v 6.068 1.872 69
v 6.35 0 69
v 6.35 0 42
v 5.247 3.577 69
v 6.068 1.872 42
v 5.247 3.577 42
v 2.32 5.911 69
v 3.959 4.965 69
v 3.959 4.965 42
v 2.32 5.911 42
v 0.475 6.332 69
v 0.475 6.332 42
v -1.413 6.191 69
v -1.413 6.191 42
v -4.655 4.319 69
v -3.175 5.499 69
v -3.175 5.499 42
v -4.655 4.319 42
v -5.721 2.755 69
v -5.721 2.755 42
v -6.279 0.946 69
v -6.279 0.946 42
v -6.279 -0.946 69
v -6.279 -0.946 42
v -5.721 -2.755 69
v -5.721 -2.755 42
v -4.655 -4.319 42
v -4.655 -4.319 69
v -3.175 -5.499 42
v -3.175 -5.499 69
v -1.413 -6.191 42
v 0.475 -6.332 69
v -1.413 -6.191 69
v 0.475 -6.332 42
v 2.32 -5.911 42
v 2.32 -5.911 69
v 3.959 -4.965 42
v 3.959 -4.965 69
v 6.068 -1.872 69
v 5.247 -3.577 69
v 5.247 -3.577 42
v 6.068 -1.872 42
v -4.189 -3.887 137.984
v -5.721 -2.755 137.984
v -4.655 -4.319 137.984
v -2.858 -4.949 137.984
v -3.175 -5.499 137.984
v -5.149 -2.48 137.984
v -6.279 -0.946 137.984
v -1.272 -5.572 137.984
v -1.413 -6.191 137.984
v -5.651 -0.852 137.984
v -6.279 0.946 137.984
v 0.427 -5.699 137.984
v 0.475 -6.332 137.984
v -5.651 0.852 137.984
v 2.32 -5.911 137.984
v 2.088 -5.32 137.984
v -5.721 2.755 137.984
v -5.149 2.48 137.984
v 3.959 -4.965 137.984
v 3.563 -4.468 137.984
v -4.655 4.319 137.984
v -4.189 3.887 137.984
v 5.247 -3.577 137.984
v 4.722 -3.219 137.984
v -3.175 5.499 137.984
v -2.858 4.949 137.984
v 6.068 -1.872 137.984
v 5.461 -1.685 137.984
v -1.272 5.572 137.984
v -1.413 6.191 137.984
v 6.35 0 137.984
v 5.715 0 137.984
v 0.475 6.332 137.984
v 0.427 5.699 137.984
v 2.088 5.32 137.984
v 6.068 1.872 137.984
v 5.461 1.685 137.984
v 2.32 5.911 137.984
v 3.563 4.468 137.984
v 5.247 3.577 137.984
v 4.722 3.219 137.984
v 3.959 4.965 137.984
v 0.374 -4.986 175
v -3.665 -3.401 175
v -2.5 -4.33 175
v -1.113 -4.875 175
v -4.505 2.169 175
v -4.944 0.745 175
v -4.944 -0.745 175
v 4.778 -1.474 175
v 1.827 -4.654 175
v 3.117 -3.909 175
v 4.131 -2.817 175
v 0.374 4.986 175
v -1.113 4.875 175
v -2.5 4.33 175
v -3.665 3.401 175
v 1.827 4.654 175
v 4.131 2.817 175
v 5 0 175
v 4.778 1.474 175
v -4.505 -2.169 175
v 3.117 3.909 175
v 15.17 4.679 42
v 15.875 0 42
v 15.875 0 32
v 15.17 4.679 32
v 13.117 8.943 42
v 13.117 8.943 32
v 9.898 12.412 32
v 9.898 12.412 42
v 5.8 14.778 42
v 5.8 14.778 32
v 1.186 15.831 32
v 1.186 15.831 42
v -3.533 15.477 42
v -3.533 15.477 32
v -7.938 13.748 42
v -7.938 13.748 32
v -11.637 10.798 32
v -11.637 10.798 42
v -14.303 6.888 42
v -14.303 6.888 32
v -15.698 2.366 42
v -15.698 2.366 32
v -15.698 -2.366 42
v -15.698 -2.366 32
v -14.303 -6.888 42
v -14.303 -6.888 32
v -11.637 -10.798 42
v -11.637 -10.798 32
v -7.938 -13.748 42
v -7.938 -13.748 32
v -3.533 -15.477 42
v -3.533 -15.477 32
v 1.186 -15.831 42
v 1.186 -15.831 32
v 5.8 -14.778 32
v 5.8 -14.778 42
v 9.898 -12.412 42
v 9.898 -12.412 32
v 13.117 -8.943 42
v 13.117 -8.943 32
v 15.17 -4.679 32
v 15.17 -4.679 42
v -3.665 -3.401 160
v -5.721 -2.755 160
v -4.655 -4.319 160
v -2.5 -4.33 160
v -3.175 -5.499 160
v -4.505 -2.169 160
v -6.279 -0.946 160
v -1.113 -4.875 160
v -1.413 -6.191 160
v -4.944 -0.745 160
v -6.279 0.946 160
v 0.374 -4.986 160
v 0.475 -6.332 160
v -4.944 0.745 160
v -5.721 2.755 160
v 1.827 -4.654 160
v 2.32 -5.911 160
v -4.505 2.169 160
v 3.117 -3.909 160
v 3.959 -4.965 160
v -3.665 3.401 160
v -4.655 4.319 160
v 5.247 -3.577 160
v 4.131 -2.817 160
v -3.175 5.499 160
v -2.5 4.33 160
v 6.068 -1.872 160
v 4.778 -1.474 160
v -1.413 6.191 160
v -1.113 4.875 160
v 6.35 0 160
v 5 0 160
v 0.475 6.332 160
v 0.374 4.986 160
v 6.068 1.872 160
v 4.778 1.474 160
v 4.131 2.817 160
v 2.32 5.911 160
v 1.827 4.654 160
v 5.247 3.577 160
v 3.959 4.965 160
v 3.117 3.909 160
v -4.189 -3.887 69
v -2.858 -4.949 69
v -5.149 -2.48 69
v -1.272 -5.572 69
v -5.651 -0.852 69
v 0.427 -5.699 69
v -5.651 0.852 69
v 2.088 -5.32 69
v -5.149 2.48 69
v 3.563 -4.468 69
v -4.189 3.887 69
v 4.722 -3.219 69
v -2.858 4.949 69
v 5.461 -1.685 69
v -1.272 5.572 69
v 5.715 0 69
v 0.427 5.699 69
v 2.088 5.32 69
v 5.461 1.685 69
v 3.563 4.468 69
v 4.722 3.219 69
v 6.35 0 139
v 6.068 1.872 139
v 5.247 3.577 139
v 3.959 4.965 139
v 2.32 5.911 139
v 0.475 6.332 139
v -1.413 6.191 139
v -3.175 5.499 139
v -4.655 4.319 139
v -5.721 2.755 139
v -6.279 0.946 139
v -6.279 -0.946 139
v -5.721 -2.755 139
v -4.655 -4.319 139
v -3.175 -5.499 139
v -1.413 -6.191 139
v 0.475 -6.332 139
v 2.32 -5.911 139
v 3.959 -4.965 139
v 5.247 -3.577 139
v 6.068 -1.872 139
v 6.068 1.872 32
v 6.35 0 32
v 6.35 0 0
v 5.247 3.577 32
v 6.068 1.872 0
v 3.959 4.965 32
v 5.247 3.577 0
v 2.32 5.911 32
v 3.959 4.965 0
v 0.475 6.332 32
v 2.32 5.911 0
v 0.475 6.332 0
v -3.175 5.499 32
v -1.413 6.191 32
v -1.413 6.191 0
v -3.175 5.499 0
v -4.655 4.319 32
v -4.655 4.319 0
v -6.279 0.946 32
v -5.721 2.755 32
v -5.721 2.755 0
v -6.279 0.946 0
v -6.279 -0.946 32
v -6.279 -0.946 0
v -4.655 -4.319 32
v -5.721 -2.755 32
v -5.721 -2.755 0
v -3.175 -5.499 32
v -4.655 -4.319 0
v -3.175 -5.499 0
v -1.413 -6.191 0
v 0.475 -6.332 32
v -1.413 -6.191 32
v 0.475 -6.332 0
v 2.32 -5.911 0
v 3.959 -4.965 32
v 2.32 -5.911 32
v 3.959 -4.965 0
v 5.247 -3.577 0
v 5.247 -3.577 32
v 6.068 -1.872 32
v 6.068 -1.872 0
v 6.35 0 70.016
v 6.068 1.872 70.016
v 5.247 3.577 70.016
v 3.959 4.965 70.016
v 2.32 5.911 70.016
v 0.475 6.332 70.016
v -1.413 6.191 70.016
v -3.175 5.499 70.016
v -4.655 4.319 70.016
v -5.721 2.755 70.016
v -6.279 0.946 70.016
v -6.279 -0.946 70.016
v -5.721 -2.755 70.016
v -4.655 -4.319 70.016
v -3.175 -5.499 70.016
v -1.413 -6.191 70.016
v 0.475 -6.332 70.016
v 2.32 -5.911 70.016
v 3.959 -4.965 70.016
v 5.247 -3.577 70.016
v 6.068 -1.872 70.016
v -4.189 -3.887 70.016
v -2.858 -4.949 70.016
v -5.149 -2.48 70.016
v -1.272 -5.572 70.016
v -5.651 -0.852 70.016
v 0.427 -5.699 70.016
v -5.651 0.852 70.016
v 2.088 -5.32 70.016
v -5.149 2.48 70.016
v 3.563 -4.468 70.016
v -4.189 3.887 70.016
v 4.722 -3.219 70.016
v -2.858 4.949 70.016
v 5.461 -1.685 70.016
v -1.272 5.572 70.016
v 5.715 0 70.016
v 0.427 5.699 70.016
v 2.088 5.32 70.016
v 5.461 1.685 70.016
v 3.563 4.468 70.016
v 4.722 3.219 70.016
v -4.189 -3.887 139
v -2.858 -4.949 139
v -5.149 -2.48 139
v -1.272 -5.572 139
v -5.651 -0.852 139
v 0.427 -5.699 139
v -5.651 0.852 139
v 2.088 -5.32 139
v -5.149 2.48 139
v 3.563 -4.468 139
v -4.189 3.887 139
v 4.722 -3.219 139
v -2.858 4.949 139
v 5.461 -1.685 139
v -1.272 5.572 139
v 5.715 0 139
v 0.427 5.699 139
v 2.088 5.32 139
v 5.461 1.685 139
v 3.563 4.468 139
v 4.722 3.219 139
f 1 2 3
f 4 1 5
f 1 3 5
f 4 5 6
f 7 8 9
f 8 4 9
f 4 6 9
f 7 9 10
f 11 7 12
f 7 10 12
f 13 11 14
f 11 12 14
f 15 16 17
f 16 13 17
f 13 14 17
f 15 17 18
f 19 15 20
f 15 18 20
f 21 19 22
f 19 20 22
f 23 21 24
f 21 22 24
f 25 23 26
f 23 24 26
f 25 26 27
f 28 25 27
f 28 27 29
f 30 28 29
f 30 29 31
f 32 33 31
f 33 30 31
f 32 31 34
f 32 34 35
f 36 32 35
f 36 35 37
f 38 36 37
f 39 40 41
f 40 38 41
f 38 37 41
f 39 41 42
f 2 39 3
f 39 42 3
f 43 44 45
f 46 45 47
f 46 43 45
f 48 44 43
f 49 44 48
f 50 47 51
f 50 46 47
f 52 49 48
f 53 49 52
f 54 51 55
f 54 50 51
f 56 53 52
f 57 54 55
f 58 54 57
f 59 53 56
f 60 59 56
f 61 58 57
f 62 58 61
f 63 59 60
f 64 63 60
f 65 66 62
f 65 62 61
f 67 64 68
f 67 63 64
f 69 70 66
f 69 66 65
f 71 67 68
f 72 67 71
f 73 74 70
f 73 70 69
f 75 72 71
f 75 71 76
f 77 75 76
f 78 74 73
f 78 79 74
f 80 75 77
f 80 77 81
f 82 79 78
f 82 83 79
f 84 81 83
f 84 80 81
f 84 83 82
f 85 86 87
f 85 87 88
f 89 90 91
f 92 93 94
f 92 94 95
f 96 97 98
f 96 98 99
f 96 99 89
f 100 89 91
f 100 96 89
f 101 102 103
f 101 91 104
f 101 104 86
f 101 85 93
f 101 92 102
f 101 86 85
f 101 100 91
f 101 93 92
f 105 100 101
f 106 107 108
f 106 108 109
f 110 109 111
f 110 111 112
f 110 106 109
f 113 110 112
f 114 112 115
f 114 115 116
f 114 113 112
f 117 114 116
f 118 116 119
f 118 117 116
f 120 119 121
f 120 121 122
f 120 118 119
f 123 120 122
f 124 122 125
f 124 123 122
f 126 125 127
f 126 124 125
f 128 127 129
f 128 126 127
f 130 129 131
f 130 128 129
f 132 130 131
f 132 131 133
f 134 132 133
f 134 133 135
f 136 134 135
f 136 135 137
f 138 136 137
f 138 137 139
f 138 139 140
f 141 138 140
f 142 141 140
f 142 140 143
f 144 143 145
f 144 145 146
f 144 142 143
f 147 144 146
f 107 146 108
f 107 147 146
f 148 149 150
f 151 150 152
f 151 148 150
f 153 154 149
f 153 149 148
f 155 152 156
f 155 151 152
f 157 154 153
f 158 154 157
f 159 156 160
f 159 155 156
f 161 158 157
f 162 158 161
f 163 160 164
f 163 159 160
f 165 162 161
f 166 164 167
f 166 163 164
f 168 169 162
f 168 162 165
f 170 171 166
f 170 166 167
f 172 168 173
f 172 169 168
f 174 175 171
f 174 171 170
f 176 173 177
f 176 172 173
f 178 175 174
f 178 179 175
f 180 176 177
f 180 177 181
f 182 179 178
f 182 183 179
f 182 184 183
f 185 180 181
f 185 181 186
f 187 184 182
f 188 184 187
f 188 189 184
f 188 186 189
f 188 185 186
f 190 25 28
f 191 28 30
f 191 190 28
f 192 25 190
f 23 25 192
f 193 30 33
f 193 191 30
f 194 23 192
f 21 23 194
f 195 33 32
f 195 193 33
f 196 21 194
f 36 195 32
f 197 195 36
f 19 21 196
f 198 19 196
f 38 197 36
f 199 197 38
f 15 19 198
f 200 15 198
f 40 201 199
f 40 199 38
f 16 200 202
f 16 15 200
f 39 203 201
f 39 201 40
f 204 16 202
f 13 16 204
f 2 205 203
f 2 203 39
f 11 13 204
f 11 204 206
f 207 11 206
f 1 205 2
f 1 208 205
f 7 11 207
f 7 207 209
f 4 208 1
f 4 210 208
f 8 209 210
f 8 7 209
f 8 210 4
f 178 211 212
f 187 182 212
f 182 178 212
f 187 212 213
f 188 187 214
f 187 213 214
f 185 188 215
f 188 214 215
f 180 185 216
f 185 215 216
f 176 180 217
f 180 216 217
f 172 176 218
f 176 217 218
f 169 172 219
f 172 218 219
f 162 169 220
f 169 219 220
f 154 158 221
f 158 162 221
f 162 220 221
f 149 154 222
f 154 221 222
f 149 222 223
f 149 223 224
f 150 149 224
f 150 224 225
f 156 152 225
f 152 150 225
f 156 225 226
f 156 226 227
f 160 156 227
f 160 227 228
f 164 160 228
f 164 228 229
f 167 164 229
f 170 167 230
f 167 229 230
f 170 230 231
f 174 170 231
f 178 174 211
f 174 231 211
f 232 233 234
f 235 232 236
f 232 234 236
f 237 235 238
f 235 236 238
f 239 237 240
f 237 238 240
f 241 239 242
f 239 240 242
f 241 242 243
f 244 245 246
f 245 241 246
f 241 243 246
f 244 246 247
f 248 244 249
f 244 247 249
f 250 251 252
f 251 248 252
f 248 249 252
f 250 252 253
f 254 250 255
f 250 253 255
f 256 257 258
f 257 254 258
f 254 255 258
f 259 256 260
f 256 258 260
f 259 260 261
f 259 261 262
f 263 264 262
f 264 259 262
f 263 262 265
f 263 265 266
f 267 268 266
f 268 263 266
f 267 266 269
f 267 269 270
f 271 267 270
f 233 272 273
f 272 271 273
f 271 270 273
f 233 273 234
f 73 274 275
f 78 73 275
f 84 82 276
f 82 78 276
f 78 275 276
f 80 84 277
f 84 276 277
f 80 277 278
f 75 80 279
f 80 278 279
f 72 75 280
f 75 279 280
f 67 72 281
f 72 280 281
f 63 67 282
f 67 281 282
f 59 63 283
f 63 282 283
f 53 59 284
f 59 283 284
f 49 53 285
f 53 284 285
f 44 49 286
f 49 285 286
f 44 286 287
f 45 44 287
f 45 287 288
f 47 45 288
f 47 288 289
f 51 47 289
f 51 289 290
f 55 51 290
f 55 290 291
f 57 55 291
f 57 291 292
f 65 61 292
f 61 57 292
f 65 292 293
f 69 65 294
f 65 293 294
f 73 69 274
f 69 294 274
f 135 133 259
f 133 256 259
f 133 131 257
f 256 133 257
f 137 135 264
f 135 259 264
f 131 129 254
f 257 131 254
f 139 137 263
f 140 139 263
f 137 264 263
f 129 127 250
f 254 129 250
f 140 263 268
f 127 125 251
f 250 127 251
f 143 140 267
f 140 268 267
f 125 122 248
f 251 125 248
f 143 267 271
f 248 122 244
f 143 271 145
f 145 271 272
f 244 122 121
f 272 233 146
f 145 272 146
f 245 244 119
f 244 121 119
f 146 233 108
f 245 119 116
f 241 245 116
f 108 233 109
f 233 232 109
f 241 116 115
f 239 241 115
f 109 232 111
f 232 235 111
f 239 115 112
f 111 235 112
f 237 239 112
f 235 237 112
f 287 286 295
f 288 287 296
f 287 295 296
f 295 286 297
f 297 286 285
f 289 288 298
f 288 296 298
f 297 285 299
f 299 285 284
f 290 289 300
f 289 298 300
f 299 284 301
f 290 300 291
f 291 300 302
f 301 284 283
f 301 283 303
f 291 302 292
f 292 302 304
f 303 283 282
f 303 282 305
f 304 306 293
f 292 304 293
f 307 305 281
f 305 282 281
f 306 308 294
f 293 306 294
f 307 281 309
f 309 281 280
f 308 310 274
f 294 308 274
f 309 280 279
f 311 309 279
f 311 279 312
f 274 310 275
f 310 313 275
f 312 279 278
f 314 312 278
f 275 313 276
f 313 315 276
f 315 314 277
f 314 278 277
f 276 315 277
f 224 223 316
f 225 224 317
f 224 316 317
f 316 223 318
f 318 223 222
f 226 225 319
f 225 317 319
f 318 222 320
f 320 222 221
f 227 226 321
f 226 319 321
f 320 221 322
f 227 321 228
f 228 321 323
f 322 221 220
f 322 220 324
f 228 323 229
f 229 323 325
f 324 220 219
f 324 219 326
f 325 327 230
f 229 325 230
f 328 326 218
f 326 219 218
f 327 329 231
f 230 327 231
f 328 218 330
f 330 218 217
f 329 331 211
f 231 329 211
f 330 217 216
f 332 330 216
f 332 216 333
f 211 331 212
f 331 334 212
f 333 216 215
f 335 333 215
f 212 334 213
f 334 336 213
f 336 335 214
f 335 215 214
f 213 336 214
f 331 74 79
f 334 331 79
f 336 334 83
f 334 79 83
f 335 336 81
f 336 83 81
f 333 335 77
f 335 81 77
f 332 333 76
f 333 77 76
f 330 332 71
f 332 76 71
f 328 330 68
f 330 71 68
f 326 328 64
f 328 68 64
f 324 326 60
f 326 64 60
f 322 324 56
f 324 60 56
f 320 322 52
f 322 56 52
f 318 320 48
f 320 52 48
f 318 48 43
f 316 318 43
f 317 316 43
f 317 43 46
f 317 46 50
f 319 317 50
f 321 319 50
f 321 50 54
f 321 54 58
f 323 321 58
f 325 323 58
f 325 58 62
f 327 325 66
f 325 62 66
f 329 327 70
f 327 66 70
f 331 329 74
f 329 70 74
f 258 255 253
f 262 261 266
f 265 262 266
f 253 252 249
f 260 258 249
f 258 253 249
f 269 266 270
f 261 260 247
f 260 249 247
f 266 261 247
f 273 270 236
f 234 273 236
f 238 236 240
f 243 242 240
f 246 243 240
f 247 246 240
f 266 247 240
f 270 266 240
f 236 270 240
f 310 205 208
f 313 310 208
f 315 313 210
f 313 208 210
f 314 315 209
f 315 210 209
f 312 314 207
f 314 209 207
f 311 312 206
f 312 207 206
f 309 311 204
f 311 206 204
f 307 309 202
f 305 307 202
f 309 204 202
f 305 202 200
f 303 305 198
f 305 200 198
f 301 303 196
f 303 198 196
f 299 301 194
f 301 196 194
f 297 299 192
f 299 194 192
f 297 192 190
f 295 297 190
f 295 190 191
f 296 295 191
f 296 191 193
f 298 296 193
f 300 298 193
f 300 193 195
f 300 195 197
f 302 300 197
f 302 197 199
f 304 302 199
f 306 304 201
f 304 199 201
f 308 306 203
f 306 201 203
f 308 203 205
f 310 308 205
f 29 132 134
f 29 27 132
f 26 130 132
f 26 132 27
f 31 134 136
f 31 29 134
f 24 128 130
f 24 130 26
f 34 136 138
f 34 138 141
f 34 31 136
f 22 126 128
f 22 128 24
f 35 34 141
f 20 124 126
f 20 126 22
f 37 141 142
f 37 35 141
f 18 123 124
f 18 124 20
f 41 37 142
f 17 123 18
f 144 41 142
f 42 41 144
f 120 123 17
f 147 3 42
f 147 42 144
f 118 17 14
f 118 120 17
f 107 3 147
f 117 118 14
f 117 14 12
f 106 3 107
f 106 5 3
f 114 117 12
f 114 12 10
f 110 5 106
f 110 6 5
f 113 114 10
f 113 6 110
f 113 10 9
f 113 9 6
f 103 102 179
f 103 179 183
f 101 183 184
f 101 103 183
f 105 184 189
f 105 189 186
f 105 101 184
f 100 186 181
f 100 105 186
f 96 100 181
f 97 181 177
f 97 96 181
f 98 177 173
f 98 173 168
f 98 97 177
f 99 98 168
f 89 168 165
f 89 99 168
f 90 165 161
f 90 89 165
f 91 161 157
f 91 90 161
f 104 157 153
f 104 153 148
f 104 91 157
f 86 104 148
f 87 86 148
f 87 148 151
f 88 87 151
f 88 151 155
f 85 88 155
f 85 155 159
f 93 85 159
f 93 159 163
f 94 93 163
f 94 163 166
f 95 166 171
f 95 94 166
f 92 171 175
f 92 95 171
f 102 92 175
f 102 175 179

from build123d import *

# Parameters (mm, degrees)
SKETCH1_R           = 6.35
BOSS_EXTRUDE1_DEPTH = 175
CUT_EXTRUDE1_START  = 175
SKETCH2_R           = 8.212767486
SKETCH2_R_2         = 5
CUT_EXTRUDE1_DEPTH  = 15
BOSS_EXTRUDE2_START = 42
SKETCH3_R           = 15.875
BOSS_EXTRUDE2_DEPTH = 10
CUT_EXTRUDE2_START  = 69
SKETCH4_R           = 12.7
SKETCH4_R_2         = 5.715
CUT_EXTRUDE2_DEPTH  = 1.016
CUT_EXTRUDE3_START  = 137.984
SKETCH5_R           = 12.7
SKETCH5_R_2         = 5.715
CUT_EXTRUDE3_DEPTH  = 1.016


with BuildPart() as part:
    # Sketch1 → Boss-Extrude1 (new body)
    with BuildSketch(Plane.XY):
        Circle(SKETCH1_R)
    extrude(amount=BOSS_EXTRUDE1_DEPTH)

    # Sketch2 → Cut-Extrude1 (cut)
    with BuildSketch(Plane.XY.offset(CUT_EXTRUDE1_START)):
        Circle(SKETCH2_R)
        Circle(SKETCH2_R_2, mode=Mode.SUBTRACT)
    extrude(amount=-CUT_EXTRUDE1_DEPTH, mode=Mode.SUBTRACT)

    # Sketch3 → Boss-Extrude2 (add)
    with BuildSketch(Plane.XY.offset(BOSS_EXTRUDE2_START)):
        Circle(SKETCH3_R)
    extrude(amount=-BOSS_EXTRUDE2_DEPTH)

    # Sketch4 → Cut-Extrude2 (cut)
    with BuildSketch(Plane.XY.offset(CUT_EXTRUDE2_START)):
        Circle(SKETCH4_R)
        Circle(SKETCH4_R_2, mode=Mode.SUBTRACT)
    extrude(amount=CUT_EXTRUDE2_DEPTH, mode=Mode.SUBTRACT)

    # Sketch5 → Cut-Extrude3 (cut)
    with BuildSketch(Plane.XY.offset(CUT_EXTRUDE3_START)):
        Circle(SKETCH5_R)
        Circle(SKETCH5_R_2, mode=Mode.SUBTRACT)
    extrude(amount=CUT_EXTRUDE3_DEPTH, mode=Mode.SUBTRACT)


solid = part.part
